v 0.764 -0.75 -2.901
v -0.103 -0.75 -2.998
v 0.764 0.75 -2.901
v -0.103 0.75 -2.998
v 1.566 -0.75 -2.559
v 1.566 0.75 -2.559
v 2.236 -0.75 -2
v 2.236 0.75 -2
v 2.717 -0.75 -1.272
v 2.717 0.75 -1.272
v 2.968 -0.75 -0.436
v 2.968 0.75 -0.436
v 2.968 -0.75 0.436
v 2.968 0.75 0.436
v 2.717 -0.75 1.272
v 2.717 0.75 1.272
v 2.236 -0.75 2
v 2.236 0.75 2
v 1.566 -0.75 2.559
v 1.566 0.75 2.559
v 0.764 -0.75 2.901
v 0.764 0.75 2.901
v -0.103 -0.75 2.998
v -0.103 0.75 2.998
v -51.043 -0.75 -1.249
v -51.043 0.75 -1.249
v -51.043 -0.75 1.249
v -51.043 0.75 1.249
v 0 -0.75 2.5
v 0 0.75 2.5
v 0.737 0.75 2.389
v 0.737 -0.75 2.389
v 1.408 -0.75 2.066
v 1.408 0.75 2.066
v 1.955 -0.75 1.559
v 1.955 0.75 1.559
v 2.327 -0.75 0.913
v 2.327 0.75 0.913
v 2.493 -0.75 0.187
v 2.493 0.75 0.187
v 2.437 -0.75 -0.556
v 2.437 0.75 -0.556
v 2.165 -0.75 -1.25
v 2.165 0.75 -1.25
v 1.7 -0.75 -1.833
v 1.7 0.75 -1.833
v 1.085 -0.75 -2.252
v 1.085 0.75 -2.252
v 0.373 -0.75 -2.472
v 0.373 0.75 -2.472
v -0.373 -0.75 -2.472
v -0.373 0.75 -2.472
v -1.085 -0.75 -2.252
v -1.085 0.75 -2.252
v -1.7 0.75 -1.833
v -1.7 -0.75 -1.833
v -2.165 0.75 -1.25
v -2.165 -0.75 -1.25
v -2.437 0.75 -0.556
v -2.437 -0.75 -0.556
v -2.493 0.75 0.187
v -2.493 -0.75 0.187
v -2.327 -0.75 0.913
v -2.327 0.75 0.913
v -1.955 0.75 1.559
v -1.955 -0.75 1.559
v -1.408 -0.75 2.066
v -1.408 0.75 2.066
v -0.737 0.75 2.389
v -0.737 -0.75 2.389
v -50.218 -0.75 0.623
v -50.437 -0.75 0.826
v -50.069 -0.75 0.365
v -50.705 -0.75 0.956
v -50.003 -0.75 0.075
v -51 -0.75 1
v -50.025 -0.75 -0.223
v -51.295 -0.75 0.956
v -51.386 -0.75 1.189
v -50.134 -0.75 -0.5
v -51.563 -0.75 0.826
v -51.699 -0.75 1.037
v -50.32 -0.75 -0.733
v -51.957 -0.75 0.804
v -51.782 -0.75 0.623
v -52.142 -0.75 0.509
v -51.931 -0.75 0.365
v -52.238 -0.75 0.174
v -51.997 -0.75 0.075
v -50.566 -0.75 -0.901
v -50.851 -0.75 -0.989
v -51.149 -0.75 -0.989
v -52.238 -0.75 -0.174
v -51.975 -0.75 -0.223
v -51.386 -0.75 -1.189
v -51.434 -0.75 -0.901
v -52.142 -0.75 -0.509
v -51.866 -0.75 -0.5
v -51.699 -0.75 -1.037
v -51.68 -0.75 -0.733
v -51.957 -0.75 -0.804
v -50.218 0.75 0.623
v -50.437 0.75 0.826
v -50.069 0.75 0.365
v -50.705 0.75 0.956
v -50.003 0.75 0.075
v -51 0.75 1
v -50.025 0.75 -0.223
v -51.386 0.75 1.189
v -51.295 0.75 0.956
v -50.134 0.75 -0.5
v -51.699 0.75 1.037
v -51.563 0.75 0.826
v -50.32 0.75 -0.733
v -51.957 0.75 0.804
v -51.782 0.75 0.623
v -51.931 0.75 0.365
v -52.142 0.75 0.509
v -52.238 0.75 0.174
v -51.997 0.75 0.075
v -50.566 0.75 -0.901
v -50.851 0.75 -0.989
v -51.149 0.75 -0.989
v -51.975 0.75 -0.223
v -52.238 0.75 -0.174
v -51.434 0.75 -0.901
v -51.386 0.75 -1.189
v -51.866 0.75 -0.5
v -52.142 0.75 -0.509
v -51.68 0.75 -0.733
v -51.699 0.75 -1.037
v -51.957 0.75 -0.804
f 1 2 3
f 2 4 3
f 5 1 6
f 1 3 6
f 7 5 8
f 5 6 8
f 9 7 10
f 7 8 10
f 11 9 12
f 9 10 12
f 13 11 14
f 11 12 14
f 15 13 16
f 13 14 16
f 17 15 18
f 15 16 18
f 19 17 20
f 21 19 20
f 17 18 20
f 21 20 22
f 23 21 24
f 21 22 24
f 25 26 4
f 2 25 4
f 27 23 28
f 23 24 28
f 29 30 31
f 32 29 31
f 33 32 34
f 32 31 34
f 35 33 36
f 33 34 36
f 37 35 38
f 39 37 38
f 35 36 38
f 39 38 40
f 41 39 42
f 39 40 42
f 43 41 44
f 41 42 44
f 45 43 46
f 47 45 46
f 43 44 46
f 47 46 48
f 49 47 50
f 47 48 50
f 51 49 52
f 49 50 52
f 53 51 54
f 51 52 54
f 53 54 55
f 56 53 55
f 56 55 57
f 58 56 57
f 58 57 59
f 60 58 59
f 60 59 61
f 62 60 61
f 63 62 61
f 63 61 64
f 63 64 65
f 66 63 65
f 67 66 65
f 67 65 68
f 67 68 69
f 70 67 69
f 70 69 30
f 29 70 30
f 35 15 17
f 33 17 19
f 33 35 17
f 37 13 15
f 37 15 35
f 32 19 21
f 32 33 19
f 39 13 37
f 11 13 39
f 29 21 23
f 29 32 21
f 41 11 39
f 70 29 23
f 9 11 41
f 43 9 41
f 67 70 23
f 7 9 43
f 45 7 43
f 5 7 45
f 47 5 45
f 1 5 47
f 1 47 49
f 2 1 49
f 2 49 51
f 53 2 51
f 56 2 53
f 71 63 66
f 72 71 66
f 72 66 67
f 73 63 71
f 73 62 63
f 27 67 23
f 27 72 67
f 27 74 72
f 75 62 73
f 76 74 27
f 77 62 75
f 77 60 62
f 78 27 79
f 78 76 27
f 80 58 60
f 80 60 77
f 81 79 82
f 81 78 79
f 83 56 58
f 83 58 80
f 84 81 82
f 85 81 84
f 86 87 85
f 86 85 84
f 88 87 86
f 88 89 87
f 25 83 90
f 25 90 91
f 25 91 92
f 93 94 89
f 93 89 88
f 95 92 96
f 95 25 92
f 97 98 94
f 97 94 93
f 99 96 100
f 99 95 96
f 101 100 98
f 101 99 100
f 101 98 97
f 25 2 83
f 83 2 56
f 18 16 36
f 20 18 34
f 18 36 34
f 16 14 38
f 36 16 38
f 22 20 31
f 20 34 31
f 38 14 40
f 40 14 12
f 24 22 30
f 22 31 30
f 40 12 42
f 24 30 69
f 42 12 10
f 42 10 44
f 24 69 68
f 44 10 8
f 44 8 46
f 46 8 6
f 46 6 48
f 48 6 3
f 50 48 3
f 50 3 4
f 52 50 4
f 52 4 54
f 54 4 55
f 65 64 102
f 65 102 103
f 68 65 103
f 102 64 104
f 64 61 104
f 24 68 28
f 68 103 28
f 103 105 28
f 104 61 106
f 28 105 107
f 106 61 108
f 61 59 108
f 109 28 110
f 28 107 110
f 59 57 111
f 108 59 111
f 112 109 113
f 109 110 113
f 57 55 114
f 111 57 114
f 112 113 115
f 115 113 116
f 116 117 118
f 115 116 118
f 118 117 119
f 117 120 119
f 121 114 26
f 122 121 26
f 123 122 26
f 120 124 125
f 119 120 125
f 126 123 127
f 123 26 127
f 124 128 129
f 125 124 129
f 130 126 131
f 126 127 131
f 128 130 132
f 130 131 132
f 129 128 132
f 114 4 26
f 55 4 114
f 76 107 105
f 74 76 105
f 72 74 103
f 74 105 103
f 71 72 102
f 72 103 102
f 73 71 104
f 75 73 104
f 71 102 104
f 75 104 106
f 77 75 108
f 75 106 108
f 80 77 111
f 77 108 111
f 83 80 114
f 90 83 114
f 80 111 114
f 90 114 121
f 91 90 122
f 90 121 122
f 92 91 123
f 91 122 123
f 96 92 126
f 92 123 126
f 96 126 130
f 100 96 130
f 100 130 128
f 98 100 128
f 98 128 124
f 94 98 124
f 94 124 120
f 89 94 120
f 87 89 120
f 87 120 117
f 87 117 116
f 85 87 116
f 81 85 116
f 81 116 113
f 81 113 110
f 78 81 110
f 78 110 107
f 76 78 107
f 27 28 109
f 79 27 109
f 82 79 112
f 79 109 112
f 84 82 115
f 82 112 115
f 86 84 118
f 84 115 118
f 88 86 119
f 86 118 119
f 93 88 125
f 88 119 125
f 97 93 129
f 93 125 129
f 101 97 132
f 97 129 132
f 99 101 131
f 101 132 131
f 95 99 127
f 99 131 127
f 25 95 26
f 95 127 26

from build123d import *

# Parameters (mm, degrees)
BOSS_EXTRUDE1_DEPTH = 0.75
CUT_EXTRUDE1_REACH  = 54.358
SKETCH3_R           = 2.5
SKETCH3_R_2         = 1


with BuildPart() as part:
    # Sketch2 → Boss-Extrude1 (new, symmetric)
    with BuildSketch(Plane(origin=(0, 0, 0), x_dir=(1, 0, 0), z_dir=(0, 1, 0))):
        with BuildLine():
            Line((-51.042892157, 1.249263888), (-0.102941176, 2.998233332))
            ThreePointArc((-0.102941176, 2.998233332), (3, 0), (-0.102941176, -2.998233332))
            Line((-0.102941176, -2.998233332), (-51.042892157, -1.249263888))
            ThreePointArc((-51.042892157, -1.249263888), (-52.25, 0), (-51.042892157, 1.249263888))
        make_face()
    extrude(amount=BOSS_EXTRUDE1_DEPTH, both=True)

    # Sketch3 → Cut-Extrude1 (cut, up to next)
    with BuildSketch(Plane(origin=(0, 0.75, 0), x_dir=(1, 0, 0), z_dir=(0, 1, 0)), mode=Mode.PRIVATE) as cut_extrude1_sk1:
        with Locations(Location((0, 0, 0), (0, 0, 270))):
            Circle(SKETCH3_R)
    cut_extrude1_tool1 = extrude(cut_extrude1_sk1.sketch, amount=-CUT_EXTRUDE1_REACH, mode=Mode.PRIVATE) & part.part
    # Sketch3 → Cut-Extrude1 (cut, up to next)
    with BuildSketch(Plane(origin=(0, 0.75, 0), x_dir=(1, 0, 0), z_dir=(0, 1, 0)), mode=Mode.PRIVATE) as cut_extrude1_sk2:
        with Locations(Location((-51, 0, 0), (0, 0, 270))):
            Circle(SKETCH3_R_2)
    cut_extrude1_tool2 = extrude(cut_extrude1_sk2.sketch, amount=-CUT_EXTRUDE1_REACH, mode=Mode.PRIVATE) & part.part
    add(cut_extrude1_tool1.solids().sort_by_distance((0, 0.75, 0))[0], mode=Mode.SUBTRACT)
    add(cut_extrude1_tool2.solids().sort_by_distance((-51, 0.75, 0))[0], mode=Mode.SUBTRACT)


solid = part.part
